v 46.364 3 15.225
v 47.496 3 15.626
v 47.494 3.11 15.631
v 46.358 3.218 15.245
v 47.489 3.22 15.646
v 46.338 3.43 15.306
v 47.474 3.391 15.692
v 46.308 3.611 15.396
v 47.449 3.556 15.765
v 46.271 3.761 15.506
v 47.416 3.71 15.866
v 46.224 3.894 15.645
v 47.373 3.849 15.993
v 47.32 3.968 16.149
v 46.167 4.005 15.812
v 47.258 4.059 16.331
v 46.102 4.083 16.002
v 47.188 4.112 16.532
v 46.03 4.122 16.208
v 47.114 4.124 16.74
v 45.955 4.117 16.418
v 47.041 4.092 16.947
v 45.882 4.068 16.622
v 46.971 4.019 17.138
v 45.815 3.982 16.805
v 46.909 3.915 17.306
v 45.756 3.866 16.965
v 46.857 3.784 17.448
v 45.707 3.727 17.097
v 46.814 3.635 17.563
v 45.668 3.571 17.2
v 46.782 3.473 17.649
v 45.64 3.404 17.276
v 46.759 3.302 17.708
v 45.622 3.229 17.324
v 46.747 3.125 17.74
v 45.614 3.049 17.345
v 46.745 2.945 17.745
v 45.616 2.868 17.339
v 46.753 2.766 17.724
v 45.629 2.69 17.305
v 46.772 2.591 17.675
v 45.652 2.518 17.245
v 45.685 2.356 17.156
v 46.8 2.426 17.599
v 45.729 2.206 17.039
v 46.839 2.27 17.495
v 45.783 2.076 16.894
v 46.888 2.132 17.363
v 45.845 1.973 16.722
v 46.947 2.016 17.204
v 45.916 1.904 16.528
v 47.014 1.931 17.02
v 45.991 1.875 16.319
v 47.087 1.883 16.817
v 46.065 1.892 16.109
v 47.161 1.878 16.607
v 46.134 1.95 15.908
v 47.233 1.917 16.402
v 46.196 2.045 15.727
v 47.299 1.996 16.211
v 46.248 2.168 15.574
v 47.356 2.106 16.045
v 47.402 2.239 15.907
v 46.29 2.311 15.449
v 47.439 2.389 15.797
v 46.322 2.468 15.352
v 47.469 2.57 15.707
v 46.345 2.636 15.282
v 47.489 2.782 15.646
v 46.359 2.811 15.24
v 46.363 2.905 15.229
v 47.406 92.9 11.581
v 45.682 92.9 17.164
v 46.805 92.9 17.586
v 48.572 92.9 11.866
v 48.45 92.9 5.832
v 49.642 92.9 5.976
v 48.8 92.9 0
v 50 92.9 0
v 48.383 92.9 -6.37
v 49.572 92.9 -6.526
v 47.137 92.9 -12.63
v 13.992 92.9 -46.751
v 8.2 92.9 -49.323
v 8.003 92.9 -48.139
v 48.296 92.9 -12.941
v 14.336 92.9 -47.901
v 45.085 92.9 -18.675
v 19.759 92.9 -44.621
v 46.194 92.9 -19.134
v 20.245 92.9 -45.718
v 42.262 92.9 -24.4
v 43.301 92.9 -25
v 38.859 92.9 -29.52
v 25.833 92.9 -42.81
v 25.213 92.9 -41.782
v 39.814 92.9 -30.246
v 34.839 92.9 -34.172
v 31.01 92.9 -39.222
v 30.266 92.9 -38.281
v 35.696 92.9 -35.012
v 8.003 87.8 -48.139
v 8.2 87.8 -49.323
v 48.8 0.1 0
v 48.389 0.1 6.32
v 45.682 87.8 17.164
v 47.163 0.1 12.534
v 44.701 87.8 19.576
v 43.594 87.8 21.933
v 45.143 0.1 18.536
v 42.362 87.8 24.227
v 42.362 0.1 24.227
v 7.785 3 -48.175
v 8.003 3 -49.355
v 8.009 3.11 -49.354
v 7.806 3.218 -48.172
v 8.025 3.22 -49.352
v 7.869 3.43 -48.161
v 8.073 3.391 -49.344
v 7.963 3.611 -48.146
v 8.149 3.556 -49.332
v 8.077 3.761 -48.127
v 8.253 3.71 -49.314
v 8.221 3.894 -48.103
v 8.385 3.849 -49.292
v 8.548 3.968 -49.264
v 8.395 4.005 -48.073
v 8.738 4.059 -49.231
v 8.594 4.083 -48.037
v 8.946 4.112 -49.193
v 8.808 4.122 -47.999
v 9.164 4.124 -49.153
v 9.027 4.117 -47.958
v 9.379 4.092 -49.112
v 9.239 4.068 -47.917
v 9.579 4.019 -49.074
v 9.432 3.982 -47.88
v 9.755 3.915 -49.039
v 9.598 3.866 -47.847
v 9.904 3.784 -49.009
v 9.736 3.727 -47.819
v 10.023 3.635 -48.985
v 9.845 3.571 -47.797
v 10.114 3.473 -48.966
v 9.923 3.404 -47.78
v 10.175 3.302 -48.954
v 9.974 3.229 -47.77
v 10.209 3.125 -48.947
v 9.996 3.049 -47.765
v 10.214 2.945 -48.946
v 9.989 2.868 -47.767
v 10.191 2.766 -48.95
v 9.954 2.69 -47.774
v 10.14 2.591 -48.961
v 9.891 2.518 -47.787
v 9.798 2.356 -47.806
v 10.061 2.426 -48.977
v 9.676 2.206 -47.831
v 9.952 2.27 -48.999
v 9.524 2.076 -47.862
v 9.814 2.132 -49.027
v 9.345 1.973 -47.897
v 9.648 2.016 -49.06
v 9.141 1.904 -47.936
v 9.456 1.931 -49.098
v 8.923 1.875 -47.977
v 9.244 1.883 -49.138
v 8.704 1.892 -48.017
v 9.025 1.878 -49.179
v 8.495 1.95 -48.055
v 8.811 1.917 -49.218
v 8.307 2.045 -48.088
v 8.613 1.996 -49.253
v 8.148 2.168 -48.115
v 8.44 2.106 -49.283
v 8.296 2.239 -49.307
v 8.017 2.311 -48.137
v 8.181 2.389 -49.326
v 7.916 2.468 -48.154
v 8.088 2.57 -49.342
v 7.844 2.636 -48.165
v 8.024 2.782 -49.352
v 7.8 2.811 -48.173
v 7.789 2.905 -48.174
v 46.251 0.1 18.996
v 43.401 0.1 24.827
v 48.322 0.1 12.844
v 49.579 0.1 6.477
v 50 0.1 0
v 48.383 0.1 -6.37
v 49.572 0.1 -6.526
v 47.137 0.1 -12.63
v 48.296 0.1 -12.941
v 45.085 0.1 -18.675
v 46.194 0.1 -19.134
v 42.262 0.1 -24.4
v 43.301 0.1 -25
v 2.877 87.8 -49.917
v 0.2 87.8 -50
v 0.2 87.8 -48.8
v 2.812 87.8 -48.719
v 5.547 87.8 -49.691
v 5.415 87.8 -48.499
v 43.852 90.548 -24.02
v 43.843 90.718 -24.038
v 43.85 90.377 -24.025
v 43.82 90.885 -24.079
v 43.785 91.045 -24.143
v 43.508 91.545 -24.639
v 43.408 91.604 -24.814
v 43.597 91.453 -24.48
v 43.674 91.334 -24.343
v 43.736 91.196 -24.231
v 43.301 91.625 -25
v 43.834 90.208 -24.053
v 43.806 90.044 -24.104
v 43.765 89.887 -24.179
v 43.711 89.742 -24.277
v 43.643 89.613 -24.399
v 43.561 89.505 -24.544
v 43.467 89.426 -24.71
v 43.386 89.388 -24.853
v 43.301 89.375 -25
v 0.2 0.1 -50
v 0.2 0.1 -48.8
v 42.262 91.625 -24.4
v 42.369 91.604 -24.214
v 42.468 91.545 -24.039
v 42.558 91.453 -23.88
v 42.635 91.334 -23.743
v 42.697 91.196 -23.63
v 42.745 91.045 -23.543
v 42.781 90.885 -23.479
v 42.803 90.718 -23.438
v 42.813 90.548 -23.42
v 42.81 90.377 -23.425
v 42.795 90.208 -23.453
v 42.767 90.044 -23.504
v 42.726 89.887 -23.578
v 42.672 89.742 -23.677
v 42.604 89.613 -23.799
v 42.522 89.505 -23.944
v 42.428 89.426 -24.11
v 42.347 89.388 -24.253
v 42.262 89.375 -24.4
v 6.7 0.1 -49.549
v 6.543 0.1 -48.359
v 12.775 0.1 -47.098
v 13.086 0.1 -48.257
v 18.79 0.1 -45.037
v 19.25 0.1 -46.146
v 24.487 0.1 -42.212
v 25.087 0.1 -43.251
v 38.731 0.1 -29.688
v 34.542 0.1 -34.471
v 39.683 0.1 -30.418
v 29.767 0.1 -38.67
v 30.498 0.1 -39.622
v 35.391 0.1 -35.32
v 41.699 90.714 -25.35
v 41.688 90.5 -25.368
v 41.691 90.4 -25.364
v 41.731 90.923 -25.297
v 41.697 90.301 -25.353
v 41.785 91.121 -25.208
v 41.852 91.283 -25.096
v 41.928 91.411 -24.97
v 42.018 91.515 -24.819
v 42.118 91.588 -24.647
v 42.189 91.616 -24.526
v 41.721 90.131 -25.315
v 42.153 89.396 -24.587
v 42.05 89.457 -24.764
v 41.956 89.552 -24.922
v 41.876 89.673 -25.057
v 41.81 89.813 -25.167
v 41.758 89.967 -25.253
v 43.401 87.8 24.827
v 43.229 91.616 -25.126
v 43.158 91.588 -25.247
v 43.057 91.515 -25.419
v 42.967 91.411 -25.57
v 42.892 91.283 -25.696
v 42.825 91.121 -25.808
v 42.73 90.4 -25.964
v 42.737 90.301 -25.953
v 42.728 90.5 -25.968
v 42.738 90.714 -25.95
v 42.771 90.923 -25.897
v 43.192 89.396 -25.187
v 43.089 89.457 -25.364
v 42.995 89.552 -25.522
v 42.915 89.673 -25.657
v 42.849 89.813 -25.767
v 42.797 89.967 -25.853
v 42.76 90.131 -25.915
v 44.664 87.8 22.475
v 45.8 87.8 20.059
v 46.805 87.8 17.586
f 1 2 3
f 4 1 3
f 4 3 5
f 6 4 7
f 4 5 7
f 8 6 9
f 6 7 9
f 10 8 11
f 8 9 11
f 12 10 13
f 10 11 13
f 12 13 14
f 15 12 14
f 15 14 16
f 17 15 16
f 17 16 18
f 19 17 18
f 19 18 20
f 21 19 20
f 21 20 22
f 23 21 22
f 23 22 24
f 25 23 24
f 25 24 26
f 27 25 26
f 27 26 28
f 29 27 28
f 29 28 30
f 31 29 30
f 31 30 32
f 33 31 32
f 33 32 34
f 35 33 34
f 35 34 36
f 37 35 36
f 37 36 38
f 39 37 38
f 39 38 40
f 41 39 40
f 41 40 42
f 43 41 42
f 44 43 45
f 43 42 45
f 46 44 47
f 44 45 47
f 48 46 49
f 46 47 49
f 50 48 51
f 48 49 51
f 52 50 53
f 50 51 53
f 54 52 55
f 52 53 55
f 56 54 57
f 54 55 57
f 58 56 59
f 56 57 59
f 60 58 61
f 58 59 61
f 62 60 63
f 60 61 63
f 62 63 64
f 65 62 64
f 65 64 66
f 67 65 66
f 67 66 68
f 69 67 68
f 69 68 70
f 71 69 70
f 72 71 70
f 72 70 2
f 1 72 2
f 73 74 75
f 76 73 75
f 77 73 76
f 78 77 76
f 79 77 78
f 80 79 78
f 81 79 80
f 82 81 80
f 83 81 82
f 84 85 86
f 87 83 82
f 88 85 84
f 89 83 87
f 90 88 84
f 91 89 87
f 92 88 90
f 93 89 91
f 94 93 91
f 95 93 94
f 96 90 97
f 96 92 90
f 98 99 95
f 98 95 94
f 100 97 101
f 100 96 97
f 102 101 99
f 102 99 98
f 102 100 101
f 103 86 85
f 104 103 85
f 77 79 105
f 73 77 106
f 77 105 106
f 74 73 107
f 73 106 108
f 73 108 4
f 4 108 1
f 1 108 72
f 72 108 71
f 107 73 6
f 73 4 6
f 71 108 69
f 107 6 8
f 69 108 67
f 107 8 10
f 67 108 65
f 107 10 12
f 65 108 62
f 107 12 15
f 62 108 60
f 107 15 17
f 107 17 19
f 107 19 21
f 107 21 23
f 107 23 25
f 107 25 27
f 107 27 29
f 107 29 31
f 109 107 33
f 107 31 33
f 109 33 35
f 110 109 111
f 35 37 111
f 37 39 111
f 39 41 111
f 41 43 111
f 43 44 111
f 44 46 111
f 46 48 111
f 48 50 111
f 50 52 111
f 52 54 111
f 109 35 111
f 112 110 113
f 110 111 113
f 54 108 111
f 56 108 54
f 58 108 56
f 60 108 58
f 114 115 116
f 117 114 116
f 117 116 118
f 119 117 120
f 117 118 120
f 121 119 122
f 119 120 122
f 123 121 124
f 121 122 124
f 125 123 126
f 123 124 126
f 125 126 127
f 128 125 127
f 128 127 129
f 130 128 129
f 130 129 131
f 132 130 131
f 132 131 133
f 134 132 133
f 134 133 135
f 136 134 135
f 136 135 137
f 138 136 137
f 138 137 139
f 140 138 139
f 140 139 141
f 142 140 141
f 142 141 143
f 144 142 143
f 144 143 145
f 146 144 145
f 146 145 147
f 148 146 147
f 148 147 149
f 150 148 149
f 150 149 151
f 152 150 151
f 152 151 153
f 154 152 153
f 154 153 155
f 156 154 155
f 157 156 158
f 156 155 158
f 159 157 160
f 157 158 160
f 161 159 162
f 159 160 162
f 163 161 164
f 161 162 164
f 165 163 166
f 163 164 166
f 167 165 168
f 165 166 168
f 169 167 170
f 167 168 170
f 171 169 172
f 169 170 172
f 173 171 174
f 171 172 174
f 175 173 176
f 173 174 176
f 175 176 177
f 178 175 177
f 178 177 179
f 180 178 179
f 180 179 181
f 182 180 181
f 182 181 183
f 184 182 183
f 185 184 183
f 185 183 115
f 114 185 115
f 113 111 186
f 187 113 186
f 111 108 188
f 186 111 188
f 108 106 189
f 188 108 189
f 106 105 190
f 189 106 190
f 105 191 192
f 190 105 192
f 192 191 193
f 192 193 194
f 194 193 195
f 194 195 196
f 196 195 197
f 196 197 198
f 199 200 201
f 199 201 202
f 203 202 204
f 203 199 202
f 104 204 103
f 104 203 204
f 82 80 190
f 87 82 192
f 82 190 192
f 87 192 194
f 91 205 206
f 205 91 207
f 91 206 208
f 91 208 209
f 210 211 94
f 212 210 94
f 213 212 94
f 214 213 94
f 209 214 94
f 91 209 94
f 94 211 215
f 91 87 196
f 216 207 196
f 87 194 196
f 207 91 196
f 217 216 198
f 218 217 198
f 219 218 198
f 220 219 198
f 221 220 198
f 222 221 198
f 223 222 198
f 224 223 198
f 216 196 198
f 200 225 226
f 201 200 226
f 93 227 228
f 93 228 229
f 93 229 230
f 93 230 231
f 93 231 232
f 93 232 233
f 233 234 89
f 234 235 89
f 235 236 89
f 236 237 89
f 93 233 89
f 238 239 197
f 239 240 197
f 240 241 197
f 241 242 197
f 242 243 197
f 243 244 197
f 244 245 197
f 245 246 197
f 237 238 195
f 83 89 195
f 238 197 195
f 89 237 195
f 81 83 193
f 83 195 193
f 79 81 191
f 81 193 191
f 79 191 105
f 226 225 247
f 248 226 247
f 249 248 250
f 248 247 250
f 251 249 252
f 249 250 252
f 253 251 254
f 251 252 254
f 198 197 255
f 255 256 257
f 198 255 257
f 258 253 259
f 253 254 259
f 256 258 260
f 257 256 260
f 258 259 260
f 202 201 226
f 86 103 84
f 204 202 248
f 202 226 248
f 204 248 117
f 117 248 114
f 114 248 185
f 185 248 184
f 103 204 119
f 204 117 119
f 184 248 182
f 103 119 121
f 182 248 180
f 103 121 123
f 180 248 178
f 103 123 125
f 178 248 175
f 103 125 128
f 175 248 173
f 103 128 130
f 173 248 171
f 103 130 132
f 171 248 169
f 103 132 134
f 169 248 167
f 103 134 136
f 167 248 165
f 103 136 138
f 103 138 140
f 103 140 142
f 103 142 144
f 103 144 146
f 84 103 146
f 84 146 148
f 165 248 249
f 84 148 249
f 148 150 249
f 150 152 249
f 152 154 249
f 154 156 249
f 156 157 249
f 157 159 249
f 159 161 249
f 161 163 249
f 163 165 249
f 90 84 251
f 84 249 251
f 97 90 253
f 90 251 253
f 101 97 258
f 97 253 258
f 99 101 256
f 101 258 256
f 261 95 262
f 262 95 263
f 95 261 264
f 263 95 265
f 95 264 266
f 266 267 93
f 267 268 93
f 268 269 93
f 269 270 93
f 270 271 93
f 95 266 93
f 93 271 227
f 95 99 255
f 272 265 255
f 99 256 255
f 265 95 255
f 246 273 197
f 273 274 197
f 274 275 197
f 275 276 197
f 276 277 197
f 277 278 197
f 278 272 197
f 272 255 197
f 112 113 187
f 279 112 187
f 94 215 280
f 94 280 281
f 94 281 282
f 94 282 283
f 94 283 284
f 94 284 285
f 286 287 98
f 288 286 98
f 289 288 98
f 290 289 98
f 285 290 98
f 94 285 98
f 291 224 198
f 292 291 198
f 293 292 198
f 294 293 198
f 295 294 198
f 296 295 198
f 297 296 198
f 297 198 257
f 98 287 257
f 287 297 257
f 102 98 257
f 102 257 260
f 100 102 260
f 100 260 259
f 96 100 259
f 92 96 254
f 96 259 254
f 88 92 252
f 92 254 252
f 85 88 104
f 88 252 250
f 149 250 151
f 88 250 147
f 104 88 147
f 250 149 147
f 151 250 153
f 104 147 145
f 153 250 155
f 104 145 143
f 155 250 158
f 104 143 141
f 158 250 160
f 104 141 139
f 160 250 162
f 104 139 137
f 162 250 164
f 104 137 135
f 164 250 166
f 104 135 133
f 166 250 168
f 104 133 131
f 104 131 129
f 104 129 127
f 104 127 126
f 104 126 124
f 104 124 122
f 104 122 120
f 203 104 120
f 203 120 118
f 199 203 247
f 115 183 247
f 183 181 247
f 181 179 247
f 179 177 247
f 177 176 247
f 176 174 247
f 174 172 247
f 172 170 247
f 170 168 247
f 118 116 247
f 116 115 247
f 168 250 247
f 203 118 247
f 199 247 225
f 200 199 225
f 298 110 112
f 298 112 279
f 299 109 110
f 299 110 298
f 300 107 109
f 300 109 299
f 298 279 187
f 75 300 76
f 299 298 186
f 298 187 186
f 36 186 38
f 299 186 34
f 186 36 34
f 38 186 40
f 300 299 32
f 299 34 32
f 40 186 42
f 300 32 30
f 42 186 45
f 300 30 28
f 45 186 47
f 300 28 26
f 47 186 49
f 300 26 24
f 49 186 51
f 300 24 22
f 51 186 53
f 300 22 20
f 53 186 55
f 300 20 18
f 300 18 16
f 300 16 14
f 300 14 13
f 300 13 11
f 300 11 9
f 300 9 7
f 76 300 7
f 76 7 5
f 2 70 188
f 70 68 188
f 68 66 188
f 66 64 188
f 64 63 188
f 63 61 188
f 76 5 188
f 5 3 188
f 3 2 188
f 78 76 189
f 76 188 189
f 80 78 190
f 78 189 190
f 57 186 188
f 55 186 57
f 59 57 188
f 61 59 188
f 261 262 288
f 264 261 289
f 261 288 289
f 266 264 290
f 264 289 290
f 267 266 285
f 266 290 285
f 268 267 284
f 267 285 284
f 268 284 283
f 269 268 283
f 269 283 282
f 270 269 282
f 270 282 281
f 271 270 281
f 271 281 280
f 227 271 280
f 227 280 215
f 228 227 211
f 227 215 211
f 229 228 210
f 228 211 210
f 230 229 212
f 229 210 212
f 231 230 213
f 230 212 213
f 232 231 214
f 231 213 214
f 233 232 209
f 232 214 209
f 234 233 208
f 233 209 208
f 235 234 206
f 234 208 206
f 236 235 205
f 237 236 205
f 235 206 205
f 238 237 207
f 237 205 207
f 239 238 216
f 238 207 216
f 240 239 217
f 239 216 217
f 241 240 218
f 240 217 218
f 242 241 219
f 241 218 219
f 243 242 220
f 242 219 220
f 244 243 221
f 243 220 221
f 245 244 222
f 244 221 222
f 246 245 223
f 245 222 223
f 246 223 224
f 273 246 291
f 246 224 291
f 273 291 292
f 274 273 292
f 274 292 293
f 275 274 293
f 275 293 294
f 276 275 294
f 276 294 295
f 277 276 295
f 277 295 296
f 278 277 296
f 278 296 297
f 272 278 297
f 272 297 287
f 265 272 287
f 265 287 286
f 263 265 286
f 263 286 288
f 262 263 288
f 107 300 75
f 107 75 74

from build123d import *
from build123d.topology import SkipClean

# Parameters (mm, degrees)
BOSS_EXTRUDE1_DEPTH = 93
SKETCH8_R           = 1.125
CUT_EXTRUDE1_DEPTH  = 124.766046621
CIRPATTERN1_COUNT   = 2
CIRPATTERN1_ANGLE   = 99
SKETCH9_R           = 1.125
CUT_EXTRUDE2_DEPTH  = 4
CUT_EXTRUDE3_START  = -5.2
CUT_EXTRUDE3_DEPTH  = 5.2
CUT_EXTRUDE4_START  = -0.1
CUT_EXTRUDE4_DEPTH  = 0.1
CUT_EXTRUDE5_DEPTH  = 0.1
CUT_EXTRUDE7_DEPTH  = 117.6697906


with BuildPart() as part:
    # Sketch1 → Boss-Extrude1 (new body)
    with BuildSketch(Plane(origin=(0, 0, 0), x_dir=(1, 0, 0), z_dir=(0, 1, 0))):
        with BuildLine():
            Line((43.301270189, 25), (42.262039705, 24.4))
            ThreePointArc((42.262039705, 24.4), (47.137180323, 12.630369401), (48.8, 0))
            ThreePointArc((48.8, 0), (47.137180323, -12.630369401), (42.262039705, -24.4))
            Line((42.262039705, -24.4), (43.301270189, -25))
            ThreePointArc((43.301270189, -25), (48.296291314, -12.940952255), (50, 0))
            ThreePointArc((50, 0), (48.296291314, 12.940952255), (43.301270189, 25))
        make_face()
        with BuildLine():
            ThreePointArc((0, 48.8), (24.4, 42.262039705), (42.262039705, 24.4))
            Line((42.262039705, 24.4), (43.301270189, 25))
            ThreePointArc((43.301270189, 25), (25, 43.301270189), (0, 50))
            Line((0, 50), (0, 48.8))
        make_face()
    extrude(amount=BOSS_EXTRUDE1_DEPTH)

    # Sketch8 → Cut-Extrude1 (cut, through all)
    with BuildSketch(Plane(origin=(47.132074555, 0, 16.690342962), x_dir=(0.33380685923377484, 0, -0.9426414910921771), z_dir=(0.9426414910921771, 0, 0.33380685923377484))):
        with Locations((0, 3)):
            Circle(SKETCH8_R)
    cut_extrude1 = extrude(amount=-CUT_EXTRUDE1_DEPTH, mode=Mode.SUBTRACT)

    # CirPattern1: Cut-Extrude1 ×2 about axis
    cirpattern1_axis = Axis((0, 93, 0), (0, 1, 0))
    for i in range(1, CIRPATTERN1_COUNT):
        add(cut_extrude1.rotate(cirpattern1_axis, i * CIRPATTERN1_ANGLE / (CIRPATTERN1_COUNT - 1)), mode=Mode.SUBTRACT)

    # Sketch9 → Cut-Extrude2 (cut)
    with SkipClean():  # the faces are left unmerged after this step: merging them gives an invalid solid
        with BuildSketch(Plane(origin=(43.301270189, 0, -25), x_dir=(-0.4999999999999981, 0, -0.8660254037844397), z_dir=(0.8660254037844398, 0, -0.4999999999999982))):
            with Locations((0, 90.5)):
                Circle(SKETCH9_R)
        extrude(amount=-CUT_EXTRUDE2_DEPTH, mode=Mode.SUBTRACT)

    # Sketch10 → Cut-Extrude3 (cut)
    with SkipClean():  # the faces are left unmerged after this step: merging them gives an invalid solid
        with BuildSketch(Plane(origin=(0, 93, 0), x_dir=(1, 0, 0), z_dir=(0, 1, 0)).offset(CUT_EXTRUDE3_START)):
            with BuildLine():
                ThreePointArc((45.681823724, -17.164235528), (44.120515076, -20.852341582), (42.262039705, -24.4))
                Line((42.262039705, -24.4), (43.301270189, -25))
                ThreePointArc((43.301270189, -25), (45.205445775, -21.365104079), (46.805147258, -17.586306893))
                Line((46.805147258, -17.586306893), (45.681823724, -17.164235528))
            make_face()
            with BuildLine():
                Line((0, 50), (0, 48.8))
                ThreePointArc((0, 48.8), (4.015214241, 48.634535616), (8.0032, 48.139264533))
                Line((8.0032, 48.139264533), (8.2, 49.323016939))
                ThreePointArc((8.2, 49.323016939), (4.113949017, 49.83046682), (0, 50))
            make_face()
        extrude(amount=CUT_EXTRUDE3_DEPTH, mode=Mode.SUBTRACT)

    # Sketch11 → Cut-Extrude4 (cut)
    with SkipClean():  # the faces are left unmerged after this step: merging them gives an invalid solid
        with BuildSketch(Plane(origin=(0, 93, 0), x_dir=(1, 0, 0), z_dir=(0, 1, 0)).offset(CUT_EXTRUDE4_START)):
            with BuildLine():
                Line((8.2, 49.323016939), (8.0032, 48.139264533))
                ThreePointArc((8.0032, 48.139264533), (42.26886825, 24.388168789), (45.681823724, -17.164235528))
                Line((45.681823724, -17.164235528), (46.805147258, -17.586306893))
                ThreePointArc((46.805147258, -17.586306893), (43.308266649, 24.987877858), (8.2, 49.323016939))
            make_face()
        extrude(amount=CUT_EXTRUDE4_DEPTH, mode=Mode.SUBTRACT)

    # Sketch1<3> → Cut-Extrude5 (cut)
    with SkipClean():  # the faces are left unmerged after this step: merging them gives an invalid solid
        with BuildSketch(Plane(origin=(0, 0, 0), x_dir=(1, 0, 0), z_dir=(0, 1, 0))):
            with BuildLine():
                Line((43.301270189, 25), (42.262039705, 24.4))
                ThreePointArc((42.262039705, 24.4), (47.137180323, 12.630369401), (48.8, 0))
                ThreePointArc((48.8, 0), (47.137180323, -12.630369401), (42.262039705, -24.4))
                Line((42.262039705, -24.4), (43.301270189, -25))
                ThreePointArc((43.301270189, -25), (48.296291314, -12.940952255), (50, 0))
                ThreePointArc((50, 0), (48.296291314, 12.940952255), (43.301270189, 25))
            make_face()
            with BuildLine():
                ThreePointArc((0, 48.8), (24.4, 42.262039705), (42.262039705, 24.4))
                Line((42.262039705, 24.4), (43.301270189, 25))
                ThreePointArc((43.301270189, 25), (25, 43.301270189), (0, 50))
                Line((0, 50), (0, 48.8))
            make_face()
        extrude(amount=CUT_EXTRUDE5_DEPTH, mode=Mode.SUBTRACT)

    # Sketch13 → Cut-Extrude7 (cut, through all)
    with SkipClean():  # the faces are left unmerged after this step: merging them gives an invalid solid
        with BuildSketch(Plane.XZ.offset(-0.1)):
            with BuildLine():
                Line((0.2, -49.999599998), (0.2, -48.799590162))
                ThreePointArc((0.2, -48.799590162), (0.10000021, -48.79989754), (0, -48.8))
                Line((0, -48.8), (0, -50))
                ThreePointArc((0, -50), (0.1000002, -49.9999), (0.2, -49.999599998))
            make_face()
            with BuildLine():
                Line((43.301270189, 25), (42.262039705, 24.4))
                ThreePointArc((42.262039705, 24.4), (42.311951077, 24.313346048), (42.361684775, 24.22659))
                Line((42.361684775, 24.22659), (43.400923778, 24.826594918))
                ThreePointArc((43.400923778, 24.826594918), (43.351183686, 24.913347286), (43.301270189, 25))
            make_face()
        extrude(amount=-CUT_EXTRUDE7_DEPTH, mode=Mode.SUBTRACT)


solid = part.part
